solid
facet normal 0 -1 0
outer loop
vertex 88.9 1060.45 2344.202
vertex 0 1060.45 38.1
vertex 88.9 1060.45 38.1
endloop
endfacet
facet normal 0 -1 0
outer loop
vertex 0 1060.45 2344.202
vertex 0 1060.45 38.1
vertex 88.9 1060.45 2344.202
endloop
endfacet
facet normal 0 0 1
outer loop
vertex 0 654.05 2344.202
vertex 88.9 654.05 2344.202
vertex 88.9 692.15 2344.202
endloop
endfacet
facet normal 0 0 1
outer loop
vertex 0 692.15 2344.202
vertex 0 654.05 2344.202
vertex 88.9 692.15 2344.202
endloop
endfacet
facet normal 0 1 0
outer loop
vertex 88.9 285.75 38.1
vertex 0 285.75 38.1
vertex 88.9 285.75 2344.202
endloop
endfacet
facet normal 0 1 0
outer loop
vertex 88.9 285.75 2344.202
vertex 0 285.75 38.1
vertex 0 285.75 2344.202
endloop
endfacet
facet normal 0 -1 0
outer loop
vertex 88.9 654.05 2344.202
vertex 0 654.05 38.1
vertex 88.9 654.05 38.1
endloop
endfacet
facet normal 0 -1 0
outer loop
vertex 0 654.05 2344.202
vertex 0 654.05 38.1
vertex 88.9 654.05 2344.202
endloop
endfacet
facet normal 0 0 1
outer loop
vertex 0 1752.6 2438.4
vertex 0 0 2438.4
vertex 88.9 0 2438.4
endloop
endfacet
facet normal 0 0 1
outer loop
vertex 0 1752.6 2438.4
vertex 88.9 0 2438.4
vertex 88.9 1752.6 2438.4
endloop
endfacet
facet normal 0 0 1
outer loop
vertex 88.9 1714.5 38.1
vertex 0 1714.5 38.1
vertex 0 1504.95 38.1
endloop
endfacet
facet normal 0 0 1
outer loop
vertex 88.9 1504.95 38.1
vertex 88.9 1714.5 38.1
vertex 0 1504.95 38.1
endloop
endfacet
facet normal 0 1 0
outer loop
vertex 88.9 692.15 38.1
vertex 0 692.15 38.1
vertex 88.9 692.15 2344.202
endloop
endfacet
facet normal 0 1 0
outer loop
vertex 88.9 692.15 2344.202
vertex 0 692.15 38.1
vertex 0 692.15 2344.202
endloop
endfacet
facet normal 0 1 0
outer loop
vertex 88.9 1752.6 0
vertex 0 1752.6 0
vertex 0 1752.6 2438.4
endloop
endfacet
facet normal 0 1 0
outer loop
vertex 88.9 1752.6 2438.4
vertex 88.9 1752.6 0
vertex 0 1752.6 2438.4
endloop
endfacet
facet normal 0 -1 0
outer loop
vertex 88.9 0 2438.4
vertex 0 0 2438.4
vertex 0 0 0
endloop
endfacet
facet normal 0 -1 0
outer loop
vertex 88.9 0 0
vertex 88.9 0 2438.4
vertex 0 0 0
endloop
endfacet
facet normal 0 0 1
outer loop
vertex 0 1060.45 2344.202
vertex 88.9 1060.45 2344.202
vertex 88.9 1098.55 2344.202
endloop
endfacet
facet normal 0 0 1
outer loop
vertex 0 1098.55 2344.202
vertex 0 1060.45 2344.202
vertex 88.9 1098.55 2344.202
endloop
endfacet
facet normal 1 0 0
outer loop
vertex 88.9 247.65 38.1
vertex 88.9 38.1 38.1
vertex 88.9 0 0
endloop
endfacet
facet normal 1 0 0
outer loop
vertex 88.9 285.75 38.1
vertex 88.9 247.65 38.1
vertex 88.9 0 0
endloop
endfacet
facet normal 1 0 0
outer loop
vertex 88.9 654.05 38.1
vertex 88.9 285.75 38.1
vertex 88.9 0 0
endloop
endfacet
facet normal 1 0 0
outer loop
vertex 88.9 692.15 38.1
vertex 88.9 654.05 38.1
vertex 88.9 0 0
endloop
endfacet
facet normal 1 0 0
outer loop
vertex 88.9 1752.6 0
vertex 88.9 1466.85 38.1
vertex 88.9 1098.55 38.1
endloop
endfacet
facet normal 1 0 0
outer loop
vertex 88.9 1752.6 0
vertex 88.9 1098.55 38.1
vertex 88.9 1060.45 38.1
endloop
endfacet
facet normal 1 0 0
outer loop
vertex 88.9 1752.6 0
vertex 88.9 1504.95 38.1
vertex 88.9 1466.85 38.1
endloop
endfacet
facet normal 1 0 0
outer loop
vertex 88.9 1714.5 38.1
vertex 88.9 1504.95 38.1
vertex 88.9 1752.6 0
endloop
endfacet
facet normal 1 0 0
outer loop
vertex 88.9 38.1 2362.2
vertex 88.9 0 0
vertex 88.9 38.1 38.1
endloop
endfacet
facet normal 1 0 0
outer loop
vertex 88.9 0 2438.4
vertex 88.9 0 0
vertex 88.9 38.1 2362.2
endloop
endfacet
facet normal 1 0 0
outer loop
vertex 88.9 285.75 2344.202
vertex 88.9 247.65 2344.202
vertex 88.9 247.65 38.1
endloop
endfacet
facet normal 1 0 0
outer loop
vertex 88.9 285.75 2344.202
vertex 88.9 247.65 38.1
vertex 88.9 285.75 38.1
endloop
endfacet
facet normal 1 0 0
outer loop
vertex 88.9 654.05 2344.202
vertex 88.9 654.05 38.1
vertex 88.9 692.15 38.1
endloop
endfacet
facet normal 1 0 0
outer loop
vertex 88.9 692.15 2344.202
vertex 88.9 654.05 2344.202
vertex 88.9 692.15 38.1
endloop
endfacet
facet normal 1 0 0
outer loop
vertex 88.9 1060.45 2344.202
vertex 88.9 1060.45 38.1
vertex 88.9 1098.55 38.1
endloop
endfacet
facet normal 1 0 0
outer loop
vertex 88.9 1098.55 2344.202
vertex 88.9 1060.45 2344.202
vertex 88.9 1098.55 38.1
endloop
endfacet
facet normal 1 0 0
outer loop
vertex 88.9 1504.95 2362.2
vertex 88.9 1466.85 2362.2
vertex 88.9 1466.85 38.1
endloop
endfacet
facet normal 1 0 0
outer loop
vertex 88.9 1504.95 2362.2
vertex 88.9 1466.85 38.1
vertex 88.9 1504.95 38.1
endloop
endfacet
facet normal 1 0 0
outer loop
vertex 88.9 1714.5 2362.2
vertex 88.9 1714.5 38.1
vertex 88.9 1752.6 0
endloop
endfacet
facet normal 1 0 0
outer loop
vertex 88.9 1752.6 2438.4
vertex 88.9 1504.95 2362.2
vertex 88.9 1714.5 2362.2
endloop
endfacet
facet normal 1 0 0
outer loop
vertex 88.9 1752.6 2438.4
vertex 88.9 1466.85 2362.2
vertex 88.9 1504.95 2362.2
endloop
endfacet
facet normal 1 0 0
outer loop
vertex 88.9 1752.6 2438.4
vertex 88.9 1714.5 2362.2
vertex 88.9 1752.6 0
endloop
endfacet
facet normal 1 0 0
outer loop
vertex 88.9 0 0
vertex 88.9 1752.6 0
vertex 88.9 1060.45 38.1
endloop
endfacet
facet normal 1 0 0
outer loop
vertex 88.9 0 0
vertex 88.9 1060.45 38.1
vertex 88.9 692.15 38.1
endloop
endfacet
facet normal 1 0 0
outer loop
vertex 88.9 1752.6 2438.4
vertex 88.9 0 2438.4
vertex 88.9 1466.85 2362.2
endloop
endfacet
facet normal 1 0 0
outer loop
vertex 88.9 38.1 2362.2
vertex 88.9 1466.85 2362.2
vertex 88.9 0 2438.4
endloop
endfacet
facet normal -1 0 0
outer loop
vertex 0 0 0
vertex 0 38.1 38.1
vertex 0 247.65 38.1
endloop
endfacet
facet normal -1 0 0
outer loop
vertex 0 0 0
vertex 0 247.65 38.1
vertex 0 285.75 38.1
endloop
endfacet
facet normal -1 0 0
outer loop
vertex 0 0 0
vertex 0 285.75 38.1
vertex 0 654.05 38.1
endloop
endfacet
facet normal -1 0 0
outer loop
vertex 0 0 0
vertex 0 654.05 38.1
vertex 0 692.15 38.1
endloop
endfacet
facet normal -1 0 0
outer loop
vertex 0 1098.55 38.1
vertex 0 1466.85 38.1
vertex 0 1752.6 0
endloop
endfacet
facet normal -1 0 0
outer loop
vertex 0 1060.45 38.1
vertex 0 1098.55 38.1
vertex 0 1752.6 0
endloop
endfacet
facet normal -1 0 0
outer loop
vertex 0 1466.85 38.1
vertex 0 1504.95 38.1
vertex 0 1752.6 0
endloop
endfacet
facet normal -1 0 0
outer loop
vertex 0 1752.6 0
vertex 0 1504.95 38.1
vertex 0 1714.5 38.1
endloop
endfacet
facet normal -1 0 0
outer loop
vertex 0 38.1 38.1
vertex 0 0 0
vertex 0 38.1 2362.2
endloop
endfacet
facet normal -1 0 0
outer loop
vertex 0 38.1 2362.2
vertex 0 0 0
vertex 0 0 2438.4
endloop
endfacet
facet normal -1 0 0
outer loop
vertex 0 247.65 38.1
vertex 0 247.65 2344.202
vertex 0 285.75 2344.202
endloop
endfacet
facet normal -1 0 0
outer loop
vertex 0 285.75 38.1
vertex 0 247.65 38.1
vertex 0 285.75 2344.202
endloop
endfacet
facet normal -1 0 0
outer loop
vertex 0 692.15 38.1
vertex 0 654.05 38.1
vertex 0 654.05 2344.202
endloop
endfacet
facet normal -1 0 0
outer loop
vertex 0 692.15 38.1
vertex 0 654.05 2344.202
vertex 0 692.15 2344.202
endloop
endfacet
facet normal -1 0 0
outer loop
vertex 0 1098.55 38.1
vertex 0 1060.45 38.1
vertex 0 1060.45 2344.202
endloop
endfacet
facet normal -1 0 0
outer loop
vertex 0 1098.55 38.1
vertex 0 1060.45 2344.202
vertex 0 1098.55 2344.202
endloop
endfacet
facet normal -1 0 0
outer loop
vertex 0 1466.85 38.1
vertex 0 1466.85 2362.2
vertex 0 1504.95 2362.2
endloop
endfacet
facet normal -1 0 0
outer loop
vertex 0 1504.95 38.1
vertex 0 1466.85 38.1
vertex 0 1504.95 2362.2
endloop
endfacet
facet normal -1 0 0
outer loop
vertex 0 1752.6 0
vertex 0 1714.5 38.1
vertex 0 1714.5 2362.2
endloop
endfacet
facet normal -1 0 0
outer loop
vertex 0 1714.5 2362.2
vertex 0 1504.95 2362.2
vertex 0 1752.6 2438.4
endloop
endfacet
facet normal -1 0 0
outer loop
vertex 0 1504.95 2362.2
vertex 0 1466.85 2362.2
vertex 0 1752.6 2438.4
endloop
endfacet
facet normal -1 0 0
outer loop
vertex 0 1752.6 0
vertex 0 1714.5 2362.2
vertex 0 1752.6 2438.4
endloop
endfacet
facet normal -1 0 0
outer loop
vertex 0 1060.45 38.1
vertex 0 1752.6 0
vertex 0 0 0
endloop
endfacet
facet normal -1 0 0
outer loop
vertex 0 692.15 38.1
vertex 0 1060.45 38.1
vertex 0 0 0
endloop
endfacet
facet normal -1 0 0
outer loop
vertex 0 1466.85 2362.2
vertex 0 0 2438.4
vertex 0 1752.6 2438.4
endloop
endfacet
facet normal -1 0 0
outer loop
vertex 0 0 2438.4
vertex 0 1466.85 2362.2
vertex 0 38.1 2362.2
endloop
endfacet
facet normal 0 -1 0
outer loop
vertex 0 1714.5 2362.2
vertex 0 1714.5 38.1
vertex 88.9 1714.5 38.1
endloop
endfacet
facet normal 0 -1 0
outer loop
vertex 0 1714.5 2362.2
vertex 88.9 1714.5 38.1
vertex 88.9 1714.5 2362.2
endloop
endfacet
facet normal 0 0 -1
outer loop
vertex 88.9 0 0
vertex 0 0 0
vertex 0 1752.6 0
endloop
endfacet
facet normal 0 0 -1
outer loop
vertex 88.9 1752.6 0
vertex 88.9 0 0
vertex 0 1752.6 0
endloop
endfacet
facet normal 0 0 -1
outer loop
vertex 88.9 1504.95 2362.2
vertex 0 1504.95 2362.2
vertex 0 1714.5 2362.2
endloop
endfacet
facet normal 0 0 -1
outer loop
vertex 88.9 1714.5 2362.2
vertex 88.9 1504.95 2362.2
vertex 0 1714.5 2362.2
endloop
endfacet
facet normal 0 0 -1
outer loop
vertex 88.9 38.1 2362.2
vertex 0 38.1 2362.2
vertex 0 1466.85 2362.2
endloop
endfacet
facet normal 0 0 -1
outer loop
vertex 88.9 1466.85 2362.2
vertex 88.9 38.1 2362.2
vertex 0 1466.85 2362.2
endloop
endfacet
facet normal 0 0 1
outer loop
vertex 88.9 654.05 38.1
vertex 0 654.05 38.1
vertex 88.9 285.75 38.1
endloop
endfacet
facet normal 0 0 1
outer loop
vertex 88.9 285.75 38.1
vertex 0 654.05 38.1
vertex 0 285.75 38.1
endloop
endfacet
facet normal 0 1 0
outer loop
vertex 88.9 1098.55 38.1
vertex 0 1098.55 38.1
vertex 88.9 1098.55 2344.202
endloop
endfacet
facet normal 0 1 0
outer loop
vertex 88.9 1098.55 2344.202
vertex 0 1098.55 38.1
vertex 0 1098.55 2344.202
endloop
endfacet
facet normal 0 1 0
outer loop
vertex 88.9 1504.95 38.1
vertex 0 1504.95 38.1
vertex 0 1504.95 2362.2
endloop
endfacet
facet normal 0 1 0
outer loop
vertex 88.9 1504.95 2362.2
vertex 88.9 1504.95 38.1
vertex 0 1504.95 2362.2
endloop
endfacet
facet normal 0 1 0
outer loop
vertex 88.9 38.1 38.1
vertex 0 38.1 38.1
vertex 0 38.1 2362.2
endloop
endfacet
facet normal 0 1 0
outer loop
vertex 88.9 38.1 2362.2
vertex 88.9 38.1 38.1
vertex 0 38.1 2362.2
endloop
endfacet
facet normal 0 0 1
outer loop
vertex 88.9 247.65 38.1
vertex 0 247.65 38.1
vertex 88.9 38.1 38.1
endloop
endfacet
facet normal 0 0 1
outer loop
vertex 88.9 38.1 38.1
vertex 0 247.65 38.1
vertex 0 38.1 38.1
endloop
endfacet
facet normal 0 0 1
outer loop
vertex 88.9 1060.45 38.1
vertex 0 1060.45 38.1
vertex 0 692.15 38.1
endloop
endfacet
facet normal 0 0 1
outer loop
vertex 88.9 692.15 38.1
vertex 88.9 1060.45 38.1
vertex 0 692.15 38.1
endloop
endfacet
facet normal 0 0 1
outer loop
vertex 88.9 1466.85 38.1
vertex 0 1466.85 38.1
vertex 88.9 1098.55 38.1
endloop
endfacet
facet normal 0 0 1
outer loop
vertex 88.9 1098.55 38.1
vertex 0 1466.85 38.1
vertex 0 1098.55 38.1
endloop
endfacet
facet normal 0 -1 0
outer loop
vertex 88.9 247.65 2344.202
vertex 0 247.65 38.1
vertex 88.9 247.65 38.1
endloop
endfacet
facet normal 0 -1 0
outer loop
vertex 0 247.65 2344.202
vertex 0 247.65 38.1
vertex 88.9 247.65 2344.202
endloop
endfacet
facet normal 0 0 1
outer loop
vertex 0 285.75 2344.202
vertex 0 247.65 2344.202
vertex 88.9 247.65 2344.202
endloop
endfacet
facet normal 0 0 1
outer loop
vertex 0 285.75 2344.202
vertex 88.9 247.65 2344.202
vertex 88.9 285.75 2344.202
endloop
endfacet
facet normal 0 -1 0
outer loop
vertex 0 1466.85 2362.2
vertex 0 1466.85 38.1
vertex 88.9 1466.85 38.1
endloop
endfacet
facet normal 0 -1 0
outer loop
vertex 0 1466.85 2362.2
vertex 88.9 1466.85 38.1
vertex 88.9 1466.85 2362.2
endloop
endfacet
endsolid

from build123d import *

# Parameters (mm, degrees)
F0_W     = 38.1
F0_H     = 2324.1
F0_W_2   = 1752.6
F0_H_2   = 38.1
F0_H_3   = 2306.102451545
F1_DEPTH = 88.9


with BuildPart() as f1:
    # F0 (on Right) → F1 (new body)
    with BuildSketch(Plane.YZ):
        Polygon((0, 38.1), (0, 0), (1752.6, 0), (1752.6, 38.1), (1714.5, 38.1), (1612.9, 38.1), (1504.95, 38.1), (1466.85, 38.1), (1098.55, 38.1), (1060.45, 38.1), (692.15, 38.1), (654.05, 38.1), (285.75, 38.1), (247.65, 38.1), (222.0338093996, 38.1), (215.9, 38.1), (177.8, 38.1), (38.1, 38.1), align=None)
        with Locations((19.05, 1200.15)):
            Rectangle(F0_W, F0_H)
        with Locations((1733.55, 1200.15)):
            Rectangle(F0_W, F0_H)
        Polygon((0, 2400.3), (0, 2362.2), (38.1, 2362.2), (177.8, 2362.2), (183.9338093996, 2362.2), (215.9, 2362.2), (1466.85, 2362.2), (1504.95, 2362.2), (1574.8, 2362.2), (1714.5, 2362.2), (1752.6, 2362.2), (1752.6, 2400.3), align=None)
        with Locations((876.3, 2419.35)):
            Rectangle(F0_W_2, F0_H_2)
        with Locations((1485.9, 1200.15)):
            Rectangle(F0_W, F0_H)
        with Locations((266.7, 1191.1512257725)):
            Rectangle(F0_W, F0_H_3)
        with Locations((1079.5, 1191.1512257725)):
            Rectangle(F0_W, F0_H_3)
        with Locations((673.1, 1191.1512257725)):
            Rectangle(F0_W, F0_H_3)
    extrude(amount=F1_DEPTH)


solid = f1.part
